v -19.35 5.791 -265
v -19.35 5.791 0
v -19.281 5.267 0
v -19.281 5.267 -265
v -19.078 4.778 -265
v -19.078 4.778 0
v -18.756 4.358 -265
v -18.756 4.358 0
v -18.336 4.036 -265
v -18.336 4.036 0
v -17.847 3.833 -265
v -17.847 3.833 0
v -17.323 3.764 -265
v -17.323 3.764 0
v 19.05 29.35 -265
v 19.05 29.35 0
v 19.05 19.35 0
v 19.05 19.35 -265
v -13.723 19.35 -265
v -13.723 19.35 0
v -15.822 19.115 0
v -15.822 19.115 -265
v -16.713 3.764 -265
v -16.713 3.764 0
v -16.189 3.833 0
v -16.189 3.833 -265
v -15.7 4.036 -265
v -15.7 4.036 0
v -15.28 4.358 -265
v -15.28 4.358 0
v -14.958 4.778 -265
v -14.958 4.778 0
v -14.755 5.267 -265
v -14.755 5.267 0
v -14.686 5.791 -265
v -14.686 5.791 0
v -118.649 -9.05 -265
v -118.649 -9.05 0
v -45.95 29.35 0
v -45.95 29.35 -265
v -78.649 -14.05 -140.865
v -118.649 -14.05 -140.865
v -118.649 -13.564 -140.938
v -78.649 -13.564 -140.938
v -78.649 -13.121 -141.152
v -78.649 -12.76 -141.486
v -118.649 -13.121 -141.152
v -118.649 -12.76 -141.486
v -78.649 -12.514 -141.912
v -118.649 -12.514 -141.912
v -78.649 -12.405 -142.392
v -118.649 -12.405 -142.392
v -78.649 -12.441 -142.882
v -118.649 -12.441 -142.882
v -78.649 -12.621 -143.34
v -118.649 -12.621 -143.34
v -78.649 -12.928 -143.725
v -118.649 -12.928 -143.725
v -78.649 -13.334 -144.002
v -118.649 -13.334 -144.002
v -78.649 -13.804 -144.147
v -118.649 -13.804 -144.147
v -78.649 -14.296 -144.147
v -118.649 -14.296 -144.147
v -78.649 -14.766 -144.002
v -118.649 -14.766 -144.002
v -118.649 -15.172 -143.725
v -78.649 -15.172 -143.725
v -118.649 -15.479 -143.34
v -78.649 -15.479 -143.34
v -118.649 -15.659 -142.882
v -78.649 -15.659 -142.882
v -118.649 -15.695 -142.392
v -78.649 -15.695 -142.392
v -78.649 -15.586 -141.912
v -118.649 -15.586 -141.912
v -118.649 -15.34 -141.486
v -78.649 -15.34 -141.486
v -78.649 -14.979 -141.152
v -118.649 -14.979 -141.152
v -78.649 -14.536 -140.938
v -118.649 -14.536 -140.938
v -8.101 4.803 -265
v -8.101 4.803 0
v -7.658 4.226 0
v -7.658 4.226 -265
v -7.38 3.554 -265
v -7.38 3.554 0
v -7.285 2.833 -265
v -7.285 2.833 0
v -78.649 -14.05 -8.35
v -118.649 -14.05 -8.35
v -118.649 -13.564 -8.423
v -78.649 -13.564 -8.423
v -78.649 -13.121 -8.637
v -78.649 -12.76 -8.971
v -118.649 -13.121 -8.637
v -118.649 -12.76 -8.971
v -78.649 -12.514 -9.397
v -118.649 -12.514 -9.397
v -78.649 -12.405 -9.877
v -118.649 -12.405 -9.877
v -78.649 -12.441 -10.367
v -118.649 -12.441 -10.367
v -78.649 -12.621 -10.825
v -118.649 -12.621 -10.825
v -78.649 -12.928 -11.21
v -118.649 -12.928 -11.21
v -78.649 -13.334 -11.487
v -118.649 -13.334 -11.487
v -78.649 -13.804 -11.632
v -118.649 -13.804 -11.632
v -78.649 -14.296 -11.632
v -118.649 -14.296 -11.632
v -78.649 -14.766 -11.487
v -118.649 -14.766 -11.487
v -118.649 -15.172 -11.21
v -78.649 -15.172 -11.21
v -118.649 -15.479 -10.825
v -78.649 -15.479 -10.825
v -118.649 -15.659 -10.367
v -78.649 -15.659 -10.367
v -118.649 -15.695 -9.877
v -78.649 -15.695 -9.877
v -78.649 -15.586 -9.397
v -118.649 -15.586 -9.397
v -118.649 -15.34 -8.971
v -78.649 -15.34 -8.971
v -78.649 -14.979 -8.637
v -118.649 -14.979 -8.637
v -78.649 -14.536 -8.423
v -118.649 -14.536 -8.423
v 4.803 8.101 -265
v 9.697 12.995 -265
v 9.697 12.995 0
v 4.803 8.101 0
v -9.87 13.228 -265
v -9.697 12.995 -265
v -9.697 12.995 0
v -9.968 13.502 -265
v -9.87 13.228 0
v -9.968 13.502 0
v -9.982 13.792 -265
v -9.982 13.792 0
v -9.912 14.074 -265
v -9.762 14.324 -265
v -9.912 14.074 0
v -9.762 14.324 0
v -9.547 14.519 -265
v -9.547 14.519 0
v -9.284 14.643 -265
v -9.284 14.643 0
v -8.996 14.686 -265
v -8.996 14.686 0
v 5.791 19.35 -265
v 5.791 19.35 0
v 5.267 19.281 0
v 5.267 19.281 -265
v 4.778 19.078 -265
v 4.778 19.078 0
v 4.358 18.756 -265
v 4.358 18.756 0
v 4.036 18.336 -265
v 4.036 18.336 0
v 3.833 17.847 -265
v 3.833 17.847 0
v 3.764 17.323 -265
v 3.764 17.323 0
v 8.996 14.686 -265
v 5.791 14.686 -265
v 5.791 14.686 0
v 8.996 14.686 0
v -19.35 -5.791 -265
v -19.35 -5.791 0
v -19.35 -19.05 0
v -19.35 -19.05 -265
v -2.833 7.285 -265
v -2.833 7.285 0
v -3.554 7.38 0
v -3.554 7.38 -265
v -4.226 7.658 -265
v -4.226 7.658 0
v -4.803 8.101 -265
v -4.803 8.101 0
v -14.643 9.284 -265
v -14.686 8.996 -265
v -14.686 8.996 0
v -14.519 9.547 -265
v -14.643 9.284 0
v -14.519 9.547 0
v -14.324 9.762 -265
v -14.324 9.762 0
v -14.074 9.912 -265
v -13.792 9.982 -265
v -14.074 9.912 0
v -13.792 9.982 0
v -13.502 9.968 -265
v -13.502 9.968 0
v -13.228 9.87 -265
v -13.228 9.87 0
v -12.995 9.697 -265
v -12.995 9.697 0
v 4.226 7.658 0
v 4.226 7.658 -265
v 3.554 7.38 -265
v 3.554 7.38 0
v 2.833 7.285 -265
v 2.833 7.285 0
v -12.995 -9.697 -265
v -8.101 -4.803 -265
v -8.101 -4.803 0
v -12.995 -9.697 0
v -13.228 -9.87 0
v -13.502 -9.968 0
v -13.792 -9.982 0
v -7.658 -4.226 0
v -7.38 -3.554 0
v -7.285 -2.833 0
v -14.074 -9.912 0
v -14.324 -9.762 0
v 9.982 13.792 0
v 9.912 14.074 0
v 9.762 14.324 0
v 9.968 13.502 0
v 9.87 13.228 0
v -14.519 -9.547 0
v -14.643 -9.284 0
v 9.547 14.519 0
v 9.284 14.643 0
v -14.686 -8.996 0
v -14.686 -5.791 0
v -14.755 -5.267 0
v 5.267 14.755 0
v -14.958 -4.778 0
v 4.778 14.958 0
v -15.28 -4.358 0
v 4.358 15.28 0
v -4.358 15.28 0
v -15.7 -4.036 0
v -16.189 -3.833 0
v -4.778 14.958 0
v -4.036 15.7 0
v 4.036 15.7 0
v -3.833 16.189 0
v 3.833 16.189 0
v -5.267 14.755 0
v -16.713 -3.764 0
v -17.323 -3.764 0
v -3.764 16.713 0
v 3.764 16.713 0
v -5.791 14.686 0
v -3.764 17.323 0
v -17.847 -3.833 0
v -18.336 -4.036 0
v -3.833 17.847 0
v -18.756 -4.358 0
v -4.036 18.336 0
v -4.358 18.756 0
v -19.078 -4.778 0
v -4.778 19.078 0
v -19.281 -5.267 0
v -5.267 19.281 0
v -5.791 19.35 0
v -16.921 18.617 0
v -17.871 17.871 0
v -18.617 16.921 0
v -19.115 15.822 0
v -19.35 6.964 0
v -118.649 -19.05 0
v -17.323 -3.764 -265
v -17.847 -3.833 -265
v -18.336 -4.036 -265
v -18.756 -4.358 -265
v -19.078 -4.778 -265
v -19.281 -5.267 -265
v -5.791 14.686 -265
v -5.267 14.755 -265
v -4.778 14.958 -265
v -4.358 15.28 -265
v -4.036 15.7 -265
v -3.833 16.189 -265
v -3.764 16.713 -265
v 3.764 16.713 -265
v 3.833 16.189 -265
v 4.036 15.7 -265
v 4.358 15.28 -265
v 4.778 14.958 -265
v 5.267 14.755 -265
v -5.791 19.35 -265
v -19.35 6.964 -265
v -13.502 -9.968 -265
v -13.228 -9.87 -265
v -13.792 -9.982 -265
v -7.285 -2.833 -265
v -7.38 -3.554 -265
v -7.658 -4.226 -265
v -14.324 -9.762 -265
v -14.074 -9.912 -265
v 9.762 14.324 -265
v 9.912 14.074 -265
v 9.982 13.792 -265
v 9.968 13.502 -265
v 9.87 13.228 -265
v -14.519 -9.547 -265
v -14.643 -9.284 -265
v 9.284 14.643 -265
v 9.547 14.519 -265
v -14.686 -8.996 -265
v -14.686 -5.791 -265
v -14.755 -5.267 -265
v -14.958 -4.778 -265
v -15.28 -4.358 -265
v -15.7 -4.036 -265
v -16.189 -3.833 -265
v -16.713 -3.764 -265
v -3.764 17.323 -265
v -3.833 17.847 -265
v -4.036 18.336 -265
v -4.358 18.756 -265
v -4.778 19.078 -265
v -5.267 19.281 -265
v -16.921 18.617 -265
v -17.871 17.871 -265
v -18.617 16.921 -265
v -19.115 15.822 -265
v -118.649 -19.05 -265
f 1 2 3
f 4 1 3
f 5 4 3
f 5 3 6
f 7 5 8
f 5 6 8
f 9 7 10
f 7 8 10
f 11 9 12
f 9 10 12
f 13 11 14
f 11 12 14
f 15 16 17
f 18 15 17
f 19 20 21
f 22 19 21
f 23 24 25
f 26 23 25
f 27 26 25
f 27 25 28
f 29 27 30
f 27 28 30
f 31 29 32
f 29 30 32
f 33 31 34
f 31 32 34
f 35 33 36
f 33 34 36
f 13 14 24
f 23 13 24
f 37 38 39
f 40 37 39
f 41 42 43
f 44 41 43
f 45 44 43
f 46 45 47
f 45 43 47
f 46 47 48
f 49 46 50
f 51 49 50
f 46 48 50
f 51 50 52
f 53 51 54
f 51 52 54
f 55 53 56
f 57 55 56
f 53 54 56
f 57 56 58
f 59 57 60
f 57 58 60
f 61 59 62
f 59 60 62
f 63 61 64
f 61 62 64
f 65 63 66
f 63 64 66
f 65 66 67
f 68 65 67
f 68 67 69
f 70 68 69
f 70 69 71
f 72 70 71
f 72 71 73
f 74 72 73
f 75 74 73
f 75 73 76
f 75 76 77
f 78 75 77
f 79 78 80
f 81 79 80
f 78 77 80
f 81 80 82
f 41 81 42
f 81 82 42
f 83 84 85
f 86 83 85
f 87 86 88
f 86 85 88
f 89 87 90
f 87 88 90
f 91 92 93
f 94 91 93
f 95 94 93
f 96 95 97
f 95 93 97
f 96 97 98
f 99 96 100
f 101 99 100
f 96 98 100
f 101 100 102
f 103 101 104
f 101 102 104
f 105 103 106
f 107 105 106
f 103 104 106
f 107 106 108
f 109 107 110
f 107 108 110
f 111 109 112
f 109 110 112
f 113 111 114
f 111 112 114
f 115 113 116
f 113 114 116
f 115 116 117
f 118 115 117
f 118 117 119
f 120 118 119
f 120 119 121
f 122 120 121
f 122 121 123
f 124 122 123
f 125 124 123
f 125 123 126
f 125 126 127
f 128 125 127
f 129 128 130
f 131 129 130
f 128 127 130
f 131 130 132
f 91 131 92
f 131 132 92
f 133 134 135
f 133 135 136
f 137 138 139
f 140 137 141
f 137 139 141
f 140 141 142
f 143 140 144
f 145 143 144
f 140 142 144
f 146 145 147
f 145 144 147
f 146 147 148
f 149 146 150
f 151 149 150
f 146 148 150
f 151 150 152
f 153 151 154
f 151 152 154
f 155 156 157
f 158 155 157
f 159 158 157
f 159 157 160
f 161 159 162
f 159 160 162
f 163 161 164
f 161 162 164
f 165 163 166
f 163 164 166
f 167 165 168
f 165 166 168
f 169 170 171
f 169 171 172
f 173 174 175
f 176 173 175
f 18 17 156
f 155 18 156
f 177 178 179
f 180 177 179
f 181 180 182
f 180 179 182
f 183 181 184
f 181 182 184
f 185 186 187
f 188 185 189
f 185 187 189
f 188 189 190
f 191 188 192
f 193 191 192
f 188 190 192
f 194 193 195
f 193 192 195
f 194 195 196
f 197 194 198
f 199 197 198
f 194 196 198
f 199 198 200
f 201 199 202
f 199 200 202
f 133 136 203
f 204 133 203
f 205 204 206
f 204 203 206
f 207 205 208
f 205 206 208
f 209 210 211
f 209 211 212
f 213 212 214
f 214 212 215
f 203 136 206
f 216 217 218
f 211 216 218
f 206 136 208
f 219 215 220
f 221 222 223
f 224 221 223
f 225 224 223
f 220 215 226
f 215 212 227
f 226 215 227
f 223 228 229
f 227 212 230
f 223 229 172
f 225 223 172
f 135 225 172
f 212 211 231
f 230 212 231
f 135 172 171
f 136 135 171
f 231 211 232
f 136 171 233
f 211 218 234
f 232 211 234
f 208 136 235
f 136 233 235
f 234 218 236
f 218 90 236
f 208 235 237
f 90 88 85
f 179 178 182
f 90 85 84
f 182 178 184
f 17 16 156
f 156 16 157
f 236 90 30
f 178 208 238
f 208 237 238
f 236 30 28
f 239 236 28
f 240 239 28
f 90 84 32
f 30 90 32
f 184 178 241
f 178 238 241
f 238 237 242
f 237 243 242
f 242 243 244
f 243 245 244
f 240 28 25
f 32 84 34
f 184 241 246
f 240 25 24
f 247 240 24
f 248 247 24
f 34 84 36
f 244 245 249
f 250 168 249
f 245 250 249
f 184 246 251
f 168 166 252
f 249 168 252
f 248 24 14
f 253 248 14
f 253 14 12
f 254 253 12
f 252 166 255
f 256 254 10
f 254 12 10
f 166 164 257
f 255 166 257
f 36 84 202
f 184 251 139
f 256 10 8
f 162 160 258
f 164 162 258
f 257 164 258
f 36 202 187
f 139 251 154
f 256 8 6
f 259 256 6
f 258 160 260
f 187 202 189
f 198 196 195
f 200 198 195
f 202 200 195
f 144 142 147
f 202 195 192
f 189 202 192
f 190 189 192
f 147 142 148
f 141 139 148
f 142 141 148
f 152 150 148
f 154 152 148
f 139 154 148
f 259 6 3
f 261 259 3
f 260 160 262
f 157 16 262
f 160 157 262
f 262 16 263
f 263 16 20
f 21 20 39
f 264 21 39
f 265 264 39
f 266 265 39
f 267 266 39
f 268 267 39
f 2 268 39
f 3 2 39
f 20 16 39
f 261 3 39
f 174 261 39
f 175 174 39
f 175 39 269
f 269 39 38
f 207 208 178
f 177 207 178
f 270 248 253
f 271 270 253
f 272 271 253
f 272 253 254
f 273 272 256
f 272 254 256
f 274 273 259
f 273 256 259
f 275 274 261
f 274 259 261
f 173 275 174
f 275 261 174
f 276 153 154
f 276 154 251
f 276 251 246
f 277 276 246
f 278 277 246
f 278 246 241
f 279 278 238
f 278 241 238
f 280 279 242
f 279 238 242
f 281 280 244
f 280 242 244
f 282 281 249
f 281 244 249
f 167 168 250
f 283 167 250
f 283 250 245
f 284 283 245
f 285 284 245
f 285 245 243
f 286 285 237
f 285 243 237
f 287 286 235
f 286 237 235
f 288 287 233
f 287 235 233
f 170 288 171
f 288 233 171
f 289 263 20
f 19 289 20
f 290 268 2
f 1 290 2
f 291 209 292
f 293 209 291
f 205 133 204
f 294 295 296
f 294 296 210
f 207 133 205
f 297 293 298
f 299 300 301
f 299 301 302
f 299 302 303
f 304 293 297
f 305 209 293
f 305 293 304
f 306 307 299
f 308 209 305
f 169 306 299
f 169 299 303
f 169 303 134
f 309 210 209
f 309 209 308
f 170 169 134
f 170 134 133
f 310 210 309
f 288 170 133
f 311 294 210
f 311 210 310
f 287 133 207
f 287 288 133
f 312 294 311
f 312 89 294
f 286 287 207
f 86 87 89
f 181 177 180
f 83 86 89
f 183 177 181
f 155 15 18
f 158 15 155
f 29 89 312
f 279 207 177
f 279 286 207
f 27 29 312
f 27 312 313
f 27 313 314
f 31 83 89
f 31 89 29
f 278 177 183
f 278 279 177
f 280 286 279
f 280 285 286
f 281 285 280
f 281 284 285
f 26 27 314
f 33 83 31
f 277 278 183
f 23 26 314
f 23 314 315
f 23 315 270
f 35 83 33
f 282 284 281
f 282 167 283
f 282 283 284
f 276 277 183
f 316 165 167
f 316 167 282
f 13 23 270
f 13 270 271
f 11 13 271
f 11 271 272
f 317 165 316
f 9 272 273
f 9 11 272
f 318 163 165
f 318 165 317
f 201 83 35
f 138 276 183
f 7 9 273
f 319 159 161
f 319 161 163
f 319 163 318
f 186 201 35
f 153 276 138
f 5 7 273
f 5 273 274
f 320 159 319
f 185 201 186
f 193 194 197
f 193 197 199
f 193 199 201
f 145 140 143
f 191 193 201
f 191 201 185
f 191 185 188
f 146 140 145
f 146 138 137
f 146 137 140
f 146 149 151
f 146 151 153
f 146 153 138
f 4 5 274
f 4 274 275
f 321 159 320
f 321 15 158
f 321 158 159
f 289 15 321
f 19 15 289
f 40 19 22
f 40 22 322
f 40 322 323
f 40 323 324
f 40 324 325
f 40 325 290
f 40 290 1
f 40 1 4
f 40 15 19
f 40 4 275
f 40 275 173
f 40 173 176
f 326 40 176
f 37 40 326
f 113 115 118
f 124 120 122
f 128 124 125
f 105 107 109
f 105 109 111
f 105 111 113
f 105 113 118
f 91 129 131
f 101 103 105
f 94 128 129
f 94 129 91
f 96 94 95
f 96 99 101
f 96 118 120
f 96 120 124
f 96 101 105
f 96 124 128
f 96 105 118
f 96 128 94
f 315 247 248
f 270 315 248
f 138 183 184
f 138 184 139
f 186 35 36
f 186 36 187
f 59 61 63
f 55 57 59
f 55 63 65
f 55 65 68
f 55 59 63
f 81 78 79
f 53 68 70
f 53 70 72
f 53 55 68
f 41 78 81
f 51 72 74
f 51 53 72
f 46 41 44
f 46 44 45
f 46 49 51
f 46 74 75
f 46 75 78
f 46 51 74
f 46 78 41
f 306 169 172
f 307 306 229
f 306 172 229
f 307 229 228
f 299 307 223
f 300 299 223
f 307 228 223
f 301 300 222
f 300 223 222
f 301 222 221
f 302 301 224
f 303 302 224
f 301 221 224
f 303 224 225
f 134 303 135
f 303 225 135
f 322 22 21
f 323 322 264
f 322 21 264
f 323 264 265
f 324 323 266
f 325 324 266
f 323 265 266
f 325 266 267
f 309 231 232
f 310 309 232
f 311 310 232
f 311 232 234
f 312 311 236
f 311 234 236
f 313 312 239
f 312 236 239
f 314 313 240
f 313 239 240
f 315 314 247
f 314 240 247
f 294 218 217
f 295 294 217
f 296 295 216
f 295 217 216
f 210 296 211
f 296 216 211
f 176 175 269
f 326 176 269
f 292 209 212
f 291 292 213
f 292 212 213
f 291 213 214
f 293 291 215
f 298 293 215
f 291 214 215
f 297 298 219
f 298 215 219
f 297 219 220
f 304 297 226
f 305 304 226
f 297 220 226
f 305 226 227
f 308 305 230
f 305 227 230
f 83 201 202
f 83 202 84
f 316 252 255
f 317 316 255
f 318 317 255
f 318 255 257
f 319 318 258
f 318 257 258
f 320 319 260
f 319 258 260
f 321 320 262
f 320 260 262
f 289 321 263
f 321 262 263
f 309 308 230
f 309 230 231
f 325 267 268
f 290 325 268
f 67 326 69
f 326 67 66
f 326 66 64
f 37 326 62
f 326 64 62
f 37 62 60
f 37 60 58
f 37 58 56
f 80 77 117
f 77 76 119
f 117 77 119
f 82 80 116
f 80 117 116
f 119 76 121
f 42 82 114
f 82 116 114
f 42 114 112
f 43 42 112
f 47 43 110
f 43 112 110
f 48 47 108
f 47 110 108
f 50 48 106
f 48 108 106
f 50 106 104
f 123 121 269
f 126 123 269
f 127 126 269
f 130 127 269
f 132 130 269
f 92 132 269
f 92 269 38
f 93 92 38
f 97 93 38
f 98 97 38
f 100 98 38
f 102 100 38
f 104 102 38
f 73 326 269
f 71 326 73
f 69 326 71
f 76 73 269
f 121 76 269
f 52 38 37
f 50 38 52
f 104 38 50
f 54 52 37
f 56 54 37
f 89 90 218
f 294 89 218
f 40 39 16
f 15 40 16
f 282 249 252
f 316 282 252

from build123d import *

# Parameters (mm, degrees)
BOSS_EXTRUDE1_DEPTH = 265
SKETCH3_R           = 1.65
CUT_EXTRUDE1_DEPTH  = 40


with BuildPart() as part:
    # Sketch2 → Boss-Extrude1 (new body)
    with BuildSketch(Plane.XY):
        with BuildLine():
            ThreePointArc((-3.764, 17.3228), (-4.357753133, 18.756246867), (-5.7912, 19.35))
            Line((-5.7912, 19.35), (-6.964305235, 19.35))
            Line((-6.964305235, 19.35), (-8.996305235, 19.35))
            Line((-8.996305235, 19.35), (-13.723477062, 19.35))
            Line((-13.723477062, 19.35), (-15.821601592, 19.115365338))
            ThreePointArc((-15.821601592, 19.115365338), (-17.870947824, 17.870947824), (-19.115365338, 15.821601592))
            Line((-19.115365338, 15.821601592), (-19.35, 6.964305235))
            Line((-19.35, 6.964305235), (-19.35, 5.7912))
            ThreePointArc((-19.35, 5.7912), (-18.756246867, 4.357753133), (-17.3228, 3.764))
            Line((-17.3228, 3.764), (-16.7132, 3.764))
            ThreePointArc((-16.7132, 3.764), (-15.279753133, 4.357753133), (-14.686, 5.7912))
            Line((-14.686, 5.7912), (-14.686, 8.996305235))
            ThreePointArc((-14.686, 8.996305235), (-14.074427708, 9.911587851), (-12.994778249, 9.696832221))
            Line((-12.994778249, 9.696832221), (-8.101029797, 4.803083769))
            ThreePointArc((-8.101029797, 4.803083769), (-7.497079234, 3.899207877), (-7.285, 2.833013566))
            Line((-7.285, 2.833013566), (-7.285, -2.833013566))
            ThreePointArc((-7.285, -2.833013566), (-7.497079234, -3.899207877), (-8.101029797, -4.803083769))
            Line((-8.101029797, -4.803083769), (-12.994778249, -9.696832221))
            ThreePointArc((-12.994778249, -9.696832221), (-14.074427708, -9.911587851), (-14.686, -8.996305235))
            Line((-14.686, -8.996305235), (-14.686, -5.7912))
            ThreePointArc((-14.686, -5.7912), (-15.279753133, -4.357753133), (-16.7132, -3.764))
            Line((-16.7132, -3.764), (-17.3228, -3.764))
            ThreePointArc((-17.3228, -3.764), (-18.756246867, -4.357753133), (-19.35, -5.7912))
            Line((-19.35, -5.7912), (-19.35, -6.964305235))
            Line((-19.35, -6.964305235), (-19.35, -19.05))
            Line((-19.35, -19.05), (-118.649495781, -19.05))
            Line((-118.649495781, -19.05), (-118.649495781, -9.05))
            Line((-118.649495781, -9.05), (-45.95, 29.35))
            Line((-45.95, 29.35), (19.05, 29.35))
            Line((19.05, 29.35), (19.05, 19.35))
            Line((19.05, 19.35), (6.964305235, 19.35))
            Line((6.964305235, 19.35), (5.7912, 19.35))
            ThreePointArc((5.7912, 19.35), (4.357753133, 18.756246867), (3.764, 17.3228))
            Line((3.764, 17.3228), (3.764, 16.7132))
            ThreePointArc((3.764, 16.7132), (4.357753133, 15.279753133), (5.7912, 14.686))
            Line((5.7912, 14.686), (8.996305235, 14.686))
            ThreePointArc((8.996305235, 14.686), (9.911587851, 14.074427708), (9.696832221, 12.994778249))
            Line((9.696832221, 12.994778249), (4.803083769, 8.101029797))
            ThreePointArc((4.803083769, 8.101029797), (3.899207877, 7.497079234), (2.833013566, 7.285))
            Line((2.833013566, 7.285), (-2.833013566, 7.285))
            ThreePointArc((-2.833013566, 7.285), (-3.899207877, 7.497079234), (-4.803083769, 8.101029797))
            Line((-4.803083769, 8.101029797), (-9.696832221, 12.994778249))
            ThreePointArc((-9.696832221, 12.994778249), (-9.911587851, 14.074427708), (-8.996305235, 14.686))
            Line((-8.996305235, 14.686), (-5.7912, 14.686))
            ThreePointArc((-5.7912, 14.686), (-4.357753133, 15.279753133), (-3.764, 16.7132))
            Line((-3.764, 16.7132), (-3.764, 17.3228))
        make_face()
    extrude(amount=-BOSS_EXTRUDE1_DEPTH)

    # Sketch3 → Cut-Extrude1 (cut)
    with BuildSketch(Plane.ZY.offset(118.649495781)):
        with Locations((-10, -14.05)):
            Circle(SKETCH3_R)
        with Locations((-275.03, -14.05)):
            Circle(SKETCH3_R)
        with Locations((-142.515, -14.05)):
            Circle(SKETCH3_R)
    extrude(amount=-CUT_EXTRUDE1_DEPTH, mode=Mode.SUBTRACT)


solid = part.part
